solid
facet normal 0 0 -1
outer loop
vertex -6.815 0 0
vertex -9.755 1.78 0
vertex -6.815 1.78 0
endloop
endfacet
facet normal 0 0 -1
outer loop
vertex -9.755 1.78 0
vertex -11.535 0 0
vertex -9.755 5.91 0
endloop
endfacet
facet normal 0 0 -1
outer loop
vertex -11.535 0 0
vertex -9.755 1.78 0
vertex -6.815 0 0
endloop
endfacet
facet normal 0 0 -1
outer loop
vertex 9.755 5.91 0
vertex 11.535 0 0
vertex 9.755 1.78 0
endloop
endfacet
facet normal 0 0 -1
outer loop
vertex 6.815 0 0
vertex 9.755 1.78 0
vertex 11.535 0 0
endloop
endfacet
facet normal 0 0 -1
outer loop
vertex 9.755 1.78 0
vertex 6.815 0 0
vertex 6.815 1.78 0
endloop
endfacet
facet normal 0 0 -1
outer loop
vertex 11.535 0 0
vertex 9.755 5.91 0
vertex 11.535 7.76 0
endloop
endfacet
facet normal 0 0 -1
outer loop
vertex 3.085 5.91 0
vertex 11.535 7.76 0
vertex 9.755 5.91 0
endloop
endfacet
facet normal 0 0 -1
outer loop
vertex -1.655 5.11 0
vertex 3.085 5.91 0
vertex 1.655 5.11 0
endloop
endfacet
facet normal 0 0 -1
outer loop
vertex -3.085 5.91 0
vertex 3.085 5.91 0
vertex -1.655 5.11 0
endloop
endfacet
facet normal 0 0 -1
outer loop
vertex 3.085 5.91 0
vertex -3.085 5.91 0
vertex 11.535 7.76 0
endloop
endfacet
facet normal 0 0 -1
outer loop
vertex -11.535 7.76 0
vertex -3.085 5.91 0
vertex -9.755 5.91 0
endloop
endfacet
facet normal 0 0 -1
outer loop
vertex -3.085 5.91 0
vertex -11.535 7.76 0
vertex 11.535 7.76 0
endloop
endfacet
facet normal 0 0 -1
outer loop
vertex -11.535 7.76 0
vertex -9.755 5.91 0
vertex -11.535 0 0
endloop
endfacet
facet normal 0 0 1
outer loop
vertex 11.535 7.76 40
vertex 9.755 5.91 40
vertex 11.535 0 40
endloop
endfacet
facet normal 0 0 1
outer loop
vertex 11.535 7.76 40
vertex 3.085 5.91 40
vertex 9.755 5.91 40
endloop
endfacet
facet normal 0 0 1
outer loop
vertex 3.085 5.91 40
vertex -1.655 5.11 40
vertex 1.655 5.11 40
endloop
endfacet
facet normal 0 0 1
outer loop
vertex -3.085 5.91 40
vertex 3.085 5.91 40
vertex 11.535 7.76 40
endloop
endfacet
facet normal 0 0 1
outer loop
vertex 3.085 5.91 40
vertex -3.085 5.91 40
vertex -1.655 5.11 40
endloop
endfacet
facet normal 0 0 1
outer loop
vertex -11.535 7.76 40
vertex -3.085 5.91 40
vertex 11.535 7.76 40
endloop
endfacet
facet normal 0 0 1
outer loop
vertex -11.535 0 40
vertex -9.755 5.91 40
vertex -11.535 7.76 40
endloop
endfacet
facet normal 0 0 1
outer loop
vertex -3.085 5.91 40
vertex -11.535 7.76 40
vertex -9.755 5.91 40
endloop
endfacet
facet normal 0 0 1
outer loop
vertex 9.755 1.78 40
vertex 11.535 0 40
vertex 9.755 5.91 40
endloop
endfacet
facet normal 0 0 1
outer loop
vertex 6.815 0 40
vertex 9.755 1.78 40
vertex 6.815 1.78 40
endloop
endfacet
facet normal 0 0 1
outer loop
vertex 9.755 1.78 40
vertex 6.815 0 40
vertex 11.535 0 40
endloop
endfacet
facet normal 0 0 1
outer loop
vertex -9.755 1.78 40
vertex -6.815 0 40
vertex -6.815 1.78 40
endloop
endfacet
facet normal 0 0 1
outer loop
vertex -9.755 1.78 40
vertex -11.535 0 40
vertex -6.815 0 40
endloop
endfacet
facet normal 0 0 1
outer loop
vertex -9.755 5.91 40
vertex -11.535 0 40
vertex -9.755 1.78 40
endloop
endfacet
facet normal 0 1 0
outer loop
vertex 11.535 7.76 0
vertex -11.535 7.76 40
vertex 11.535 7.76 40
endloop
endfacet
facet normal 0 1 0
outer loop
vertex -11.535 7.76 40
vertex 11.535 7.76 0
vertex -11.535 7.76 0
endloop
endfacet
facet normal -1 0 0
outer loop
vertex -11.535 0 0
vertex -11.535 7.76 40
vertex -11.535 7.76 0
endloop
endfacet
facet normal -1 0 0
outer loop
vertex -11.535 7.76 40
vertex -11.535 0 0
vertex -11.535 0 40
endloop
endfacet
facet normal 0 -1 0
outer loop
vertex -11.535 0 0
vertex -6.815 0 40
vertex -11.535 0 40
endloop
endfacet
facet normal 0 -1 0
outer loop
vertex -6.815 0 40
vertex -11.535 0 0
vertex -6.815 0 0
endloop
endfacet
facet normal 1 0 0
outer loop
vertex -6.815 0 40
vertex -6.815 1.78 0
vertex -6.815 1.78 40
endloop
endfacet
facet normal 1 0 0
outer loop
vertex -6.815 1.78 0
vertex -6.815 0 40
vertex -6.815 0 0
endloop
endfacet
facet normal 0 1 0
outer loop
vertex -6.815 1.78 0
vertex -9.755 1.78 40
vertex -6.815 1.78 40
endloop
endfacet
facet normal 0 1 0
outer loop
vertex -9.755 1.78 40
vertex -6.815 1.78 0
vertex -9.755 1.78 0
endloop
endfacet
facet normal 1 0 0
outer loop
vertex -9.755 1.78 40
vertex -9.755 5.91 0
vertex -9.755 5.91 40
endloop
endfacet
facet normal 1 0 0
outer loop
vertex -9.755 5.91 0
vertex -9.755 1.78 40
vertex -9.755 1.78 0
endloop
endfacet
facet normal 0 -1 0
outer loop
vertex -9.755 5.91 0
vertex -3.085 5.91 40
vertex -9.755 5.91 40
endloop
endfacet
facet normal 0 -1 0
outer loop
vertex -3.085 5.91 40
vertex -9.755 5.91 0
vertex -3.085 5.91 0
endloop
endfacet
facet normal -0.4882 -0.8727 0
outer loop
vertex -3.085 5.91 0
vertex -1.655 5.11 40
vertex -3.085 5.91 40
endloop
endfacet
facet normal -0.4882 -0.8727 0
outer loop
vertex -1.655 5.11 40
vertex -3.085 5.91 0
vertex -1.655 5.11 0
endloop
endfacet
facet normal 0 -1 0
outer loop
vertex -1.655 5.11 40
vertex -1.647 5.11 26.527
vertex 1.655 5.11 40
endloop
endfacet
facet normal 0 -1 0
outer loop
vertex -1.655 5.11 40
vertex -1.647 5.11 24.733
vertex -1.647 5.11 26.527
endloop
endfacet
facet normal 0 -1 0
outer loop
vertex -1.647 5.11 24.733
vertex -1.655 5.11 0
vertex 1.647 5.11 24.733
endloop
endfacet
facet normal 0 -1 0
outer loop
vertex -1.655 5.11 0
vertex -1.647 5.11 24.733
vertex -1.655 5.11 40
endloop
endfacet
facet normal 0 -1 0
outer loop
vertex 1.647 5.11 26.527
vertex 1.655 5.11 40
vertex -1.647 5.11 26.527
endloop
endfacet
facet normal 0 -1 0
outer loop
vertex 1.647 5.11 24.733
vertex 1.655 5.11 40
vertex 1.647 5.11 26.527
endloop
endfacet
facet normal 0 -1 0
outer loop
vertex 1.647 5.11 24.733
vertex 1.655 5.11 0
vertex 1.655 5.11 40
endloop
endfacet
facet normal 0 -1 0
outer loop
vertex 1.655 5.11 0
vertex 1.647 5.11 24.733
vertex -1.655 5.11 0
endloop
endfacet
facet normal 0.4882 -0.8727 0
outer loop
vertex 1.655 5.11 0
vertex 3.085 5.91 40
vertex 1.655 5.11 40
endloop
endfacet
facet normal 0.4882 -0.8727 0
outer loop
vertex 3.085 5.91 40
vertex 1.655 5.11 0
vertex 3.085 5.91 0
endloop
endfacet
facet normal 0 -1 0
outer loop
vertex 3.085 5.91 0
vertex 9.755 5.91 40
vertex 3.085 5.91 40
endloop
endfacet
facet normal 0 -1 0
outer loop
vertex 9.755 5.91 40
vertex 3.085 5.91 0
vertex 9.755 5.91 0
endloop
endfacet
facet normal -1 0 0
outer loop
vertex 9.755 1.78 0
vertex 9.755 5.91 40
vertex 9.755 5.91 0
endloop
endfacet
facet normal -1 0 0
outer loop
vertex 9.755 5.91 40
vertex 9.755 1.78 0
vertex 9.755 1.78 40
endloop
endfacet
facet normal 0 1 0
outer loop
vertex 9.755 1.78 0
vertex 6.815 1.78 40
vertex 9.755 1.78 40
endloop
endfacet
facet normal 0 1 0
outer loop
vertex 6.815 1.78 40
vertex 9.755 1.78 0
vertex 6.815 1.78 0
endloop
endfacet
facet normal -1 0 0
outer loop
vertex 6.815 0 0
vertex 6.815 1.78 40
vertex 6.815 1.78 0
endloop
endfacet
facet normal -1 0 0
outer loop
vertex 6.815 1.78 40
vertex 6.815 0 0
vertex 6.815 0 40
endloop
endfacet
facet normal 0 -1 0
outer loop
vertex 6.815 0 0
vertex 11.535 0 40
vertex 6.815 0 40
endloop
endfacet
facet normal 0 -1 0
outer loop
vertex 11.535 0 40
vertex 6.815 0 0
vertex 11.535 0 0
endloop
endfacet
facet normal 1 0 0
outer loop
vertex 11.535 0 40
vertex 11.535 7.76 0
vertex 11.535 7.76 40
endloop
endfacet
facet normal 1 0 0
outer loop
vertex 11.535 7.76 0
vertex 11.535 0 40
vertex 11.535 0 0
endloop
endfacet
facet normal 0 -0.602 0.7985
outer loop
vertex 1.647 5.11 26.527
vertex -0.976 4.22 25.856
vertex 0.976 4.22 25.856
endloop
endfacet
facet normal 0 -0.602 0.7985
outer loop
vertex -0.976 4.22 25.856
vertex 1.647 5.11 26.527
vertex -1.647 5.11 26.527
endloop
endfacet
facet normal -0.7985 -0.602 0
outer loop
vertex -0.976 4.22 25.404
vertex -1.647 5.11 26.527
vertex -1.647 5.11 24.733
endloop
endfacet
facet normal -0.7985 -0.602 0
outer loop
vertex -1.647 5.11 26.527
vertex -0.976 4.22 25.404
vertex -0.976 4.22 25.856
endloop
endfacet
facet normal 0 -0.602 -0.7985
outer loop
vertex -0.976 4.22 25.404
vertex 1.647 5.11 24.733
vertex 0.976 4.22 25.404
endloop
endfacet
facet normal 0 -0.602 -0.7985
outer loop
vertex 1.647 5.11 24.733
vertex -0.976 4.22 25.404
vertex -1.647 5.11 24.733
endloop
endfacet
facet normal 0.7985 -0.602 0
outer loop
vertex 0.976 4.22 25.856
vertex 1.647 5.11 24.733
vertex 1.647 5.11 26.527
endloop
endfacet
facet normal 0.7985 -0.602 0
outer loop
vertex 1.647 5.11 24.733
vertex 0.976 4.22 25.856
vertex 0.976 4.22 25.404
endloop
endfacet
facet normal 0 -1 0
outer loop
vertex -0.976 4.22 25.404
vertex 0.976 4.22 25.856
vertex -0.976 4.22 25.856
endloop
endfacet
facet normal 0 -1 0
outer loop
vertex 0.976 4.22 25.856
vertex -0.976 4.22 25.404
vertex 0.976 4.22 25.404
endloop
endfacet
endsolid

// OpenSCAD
module nerfRail(positive=false,length=40,tolerance=0.25) {
    outerWidth = 18.25;
    outerThickness = 2.87;
    valleyDepth = 1.43;
    shoulderWidth = 5.41;
    nubDistanceFromFront = 15;
    nubSize=1.81;
    nubThickness=.9;
    overhang = 2.94;
    outerDepth = 3.56;
    nudge = 0.01;
        
    // positive tolerance makes it larger
    module positiveRailProfile(tolerance=0) {
        echo(tolerance);
    points=[[-outerWidth/2-tolerance+overhang,0],
        [-outerWidth/2-tolerance+overhang,outerDepth-tolerance],
        [-outerWidth/2-tolerance,outerDepth-tolerance],
        [-outerWidth/2-tolerance,outerDepth+outerThickness+tolerance],
        [-outerWidth/2+shoulderWidth+tolerance,outerDepth+outerThickness+tolerance],
        [-outerWidth/2+shoulderWidth+tolerance+valleyDepth,
        outerDepth+outerThickness+tolerance-valleyDepth+tolerance],
        [nudge,
        outerDepth+outerThickness+tolerance-valleyDepth+tolerance],
        [nudge,0]    
        ];

        union() {
            polygon(points=points);
            scale([-1,1,1]) polygon(points=points);
        }
    }

    module negativeRailProfile(tolerance=0.25) {
        translate([0,-outerDepth/2+tolerance])
        render(convexity=3) difference() {
            translate([-tolerance-outerWidth/2-outerDepth/2,outerDepth/2-tolerance]) square([outerWidth+outerDepth+2*tolerance,overhang+outerDepth+2*tolerance]);
            positiveRailProfile(tolerance=tolerance);
        }
        
        
    }
    
    module nub() {
        hull() {
        translate([-outerWidth/2+shoulderWidth+tolerance+valleyDepth+nubSize/2,0,0])
        rotate([90,0,0])
        linear_extrude(height=nubThickness,scale=0.25)
        square(nubSize,center=true);
        translate(-[-outerWidth/2+shoulderWidth+tolerance+valleyDepth+nubSize/2,0,0])
        rotate([90,0,0])
        linear_extrude(height=nubThickness,scale=0.25)
        square(nubSize,center=true);
        }
    }
        
    if (positive) {
        linear_extrude(height=length)
        positiveRailProfile(tolerance=-tolerance);
    }
    else {
        linear_extrude(height=length)
        negativeRailProfile(tolerance=tolerance);
        translate([0,(outerDepth+outerThickness+3*tolerance-valleyDepth)-outerDepth/2+nudge,length-nubDistanceFromFront+tolerance])
        nub();
    }
  
}

nerfRail(tolerance=0.63);
